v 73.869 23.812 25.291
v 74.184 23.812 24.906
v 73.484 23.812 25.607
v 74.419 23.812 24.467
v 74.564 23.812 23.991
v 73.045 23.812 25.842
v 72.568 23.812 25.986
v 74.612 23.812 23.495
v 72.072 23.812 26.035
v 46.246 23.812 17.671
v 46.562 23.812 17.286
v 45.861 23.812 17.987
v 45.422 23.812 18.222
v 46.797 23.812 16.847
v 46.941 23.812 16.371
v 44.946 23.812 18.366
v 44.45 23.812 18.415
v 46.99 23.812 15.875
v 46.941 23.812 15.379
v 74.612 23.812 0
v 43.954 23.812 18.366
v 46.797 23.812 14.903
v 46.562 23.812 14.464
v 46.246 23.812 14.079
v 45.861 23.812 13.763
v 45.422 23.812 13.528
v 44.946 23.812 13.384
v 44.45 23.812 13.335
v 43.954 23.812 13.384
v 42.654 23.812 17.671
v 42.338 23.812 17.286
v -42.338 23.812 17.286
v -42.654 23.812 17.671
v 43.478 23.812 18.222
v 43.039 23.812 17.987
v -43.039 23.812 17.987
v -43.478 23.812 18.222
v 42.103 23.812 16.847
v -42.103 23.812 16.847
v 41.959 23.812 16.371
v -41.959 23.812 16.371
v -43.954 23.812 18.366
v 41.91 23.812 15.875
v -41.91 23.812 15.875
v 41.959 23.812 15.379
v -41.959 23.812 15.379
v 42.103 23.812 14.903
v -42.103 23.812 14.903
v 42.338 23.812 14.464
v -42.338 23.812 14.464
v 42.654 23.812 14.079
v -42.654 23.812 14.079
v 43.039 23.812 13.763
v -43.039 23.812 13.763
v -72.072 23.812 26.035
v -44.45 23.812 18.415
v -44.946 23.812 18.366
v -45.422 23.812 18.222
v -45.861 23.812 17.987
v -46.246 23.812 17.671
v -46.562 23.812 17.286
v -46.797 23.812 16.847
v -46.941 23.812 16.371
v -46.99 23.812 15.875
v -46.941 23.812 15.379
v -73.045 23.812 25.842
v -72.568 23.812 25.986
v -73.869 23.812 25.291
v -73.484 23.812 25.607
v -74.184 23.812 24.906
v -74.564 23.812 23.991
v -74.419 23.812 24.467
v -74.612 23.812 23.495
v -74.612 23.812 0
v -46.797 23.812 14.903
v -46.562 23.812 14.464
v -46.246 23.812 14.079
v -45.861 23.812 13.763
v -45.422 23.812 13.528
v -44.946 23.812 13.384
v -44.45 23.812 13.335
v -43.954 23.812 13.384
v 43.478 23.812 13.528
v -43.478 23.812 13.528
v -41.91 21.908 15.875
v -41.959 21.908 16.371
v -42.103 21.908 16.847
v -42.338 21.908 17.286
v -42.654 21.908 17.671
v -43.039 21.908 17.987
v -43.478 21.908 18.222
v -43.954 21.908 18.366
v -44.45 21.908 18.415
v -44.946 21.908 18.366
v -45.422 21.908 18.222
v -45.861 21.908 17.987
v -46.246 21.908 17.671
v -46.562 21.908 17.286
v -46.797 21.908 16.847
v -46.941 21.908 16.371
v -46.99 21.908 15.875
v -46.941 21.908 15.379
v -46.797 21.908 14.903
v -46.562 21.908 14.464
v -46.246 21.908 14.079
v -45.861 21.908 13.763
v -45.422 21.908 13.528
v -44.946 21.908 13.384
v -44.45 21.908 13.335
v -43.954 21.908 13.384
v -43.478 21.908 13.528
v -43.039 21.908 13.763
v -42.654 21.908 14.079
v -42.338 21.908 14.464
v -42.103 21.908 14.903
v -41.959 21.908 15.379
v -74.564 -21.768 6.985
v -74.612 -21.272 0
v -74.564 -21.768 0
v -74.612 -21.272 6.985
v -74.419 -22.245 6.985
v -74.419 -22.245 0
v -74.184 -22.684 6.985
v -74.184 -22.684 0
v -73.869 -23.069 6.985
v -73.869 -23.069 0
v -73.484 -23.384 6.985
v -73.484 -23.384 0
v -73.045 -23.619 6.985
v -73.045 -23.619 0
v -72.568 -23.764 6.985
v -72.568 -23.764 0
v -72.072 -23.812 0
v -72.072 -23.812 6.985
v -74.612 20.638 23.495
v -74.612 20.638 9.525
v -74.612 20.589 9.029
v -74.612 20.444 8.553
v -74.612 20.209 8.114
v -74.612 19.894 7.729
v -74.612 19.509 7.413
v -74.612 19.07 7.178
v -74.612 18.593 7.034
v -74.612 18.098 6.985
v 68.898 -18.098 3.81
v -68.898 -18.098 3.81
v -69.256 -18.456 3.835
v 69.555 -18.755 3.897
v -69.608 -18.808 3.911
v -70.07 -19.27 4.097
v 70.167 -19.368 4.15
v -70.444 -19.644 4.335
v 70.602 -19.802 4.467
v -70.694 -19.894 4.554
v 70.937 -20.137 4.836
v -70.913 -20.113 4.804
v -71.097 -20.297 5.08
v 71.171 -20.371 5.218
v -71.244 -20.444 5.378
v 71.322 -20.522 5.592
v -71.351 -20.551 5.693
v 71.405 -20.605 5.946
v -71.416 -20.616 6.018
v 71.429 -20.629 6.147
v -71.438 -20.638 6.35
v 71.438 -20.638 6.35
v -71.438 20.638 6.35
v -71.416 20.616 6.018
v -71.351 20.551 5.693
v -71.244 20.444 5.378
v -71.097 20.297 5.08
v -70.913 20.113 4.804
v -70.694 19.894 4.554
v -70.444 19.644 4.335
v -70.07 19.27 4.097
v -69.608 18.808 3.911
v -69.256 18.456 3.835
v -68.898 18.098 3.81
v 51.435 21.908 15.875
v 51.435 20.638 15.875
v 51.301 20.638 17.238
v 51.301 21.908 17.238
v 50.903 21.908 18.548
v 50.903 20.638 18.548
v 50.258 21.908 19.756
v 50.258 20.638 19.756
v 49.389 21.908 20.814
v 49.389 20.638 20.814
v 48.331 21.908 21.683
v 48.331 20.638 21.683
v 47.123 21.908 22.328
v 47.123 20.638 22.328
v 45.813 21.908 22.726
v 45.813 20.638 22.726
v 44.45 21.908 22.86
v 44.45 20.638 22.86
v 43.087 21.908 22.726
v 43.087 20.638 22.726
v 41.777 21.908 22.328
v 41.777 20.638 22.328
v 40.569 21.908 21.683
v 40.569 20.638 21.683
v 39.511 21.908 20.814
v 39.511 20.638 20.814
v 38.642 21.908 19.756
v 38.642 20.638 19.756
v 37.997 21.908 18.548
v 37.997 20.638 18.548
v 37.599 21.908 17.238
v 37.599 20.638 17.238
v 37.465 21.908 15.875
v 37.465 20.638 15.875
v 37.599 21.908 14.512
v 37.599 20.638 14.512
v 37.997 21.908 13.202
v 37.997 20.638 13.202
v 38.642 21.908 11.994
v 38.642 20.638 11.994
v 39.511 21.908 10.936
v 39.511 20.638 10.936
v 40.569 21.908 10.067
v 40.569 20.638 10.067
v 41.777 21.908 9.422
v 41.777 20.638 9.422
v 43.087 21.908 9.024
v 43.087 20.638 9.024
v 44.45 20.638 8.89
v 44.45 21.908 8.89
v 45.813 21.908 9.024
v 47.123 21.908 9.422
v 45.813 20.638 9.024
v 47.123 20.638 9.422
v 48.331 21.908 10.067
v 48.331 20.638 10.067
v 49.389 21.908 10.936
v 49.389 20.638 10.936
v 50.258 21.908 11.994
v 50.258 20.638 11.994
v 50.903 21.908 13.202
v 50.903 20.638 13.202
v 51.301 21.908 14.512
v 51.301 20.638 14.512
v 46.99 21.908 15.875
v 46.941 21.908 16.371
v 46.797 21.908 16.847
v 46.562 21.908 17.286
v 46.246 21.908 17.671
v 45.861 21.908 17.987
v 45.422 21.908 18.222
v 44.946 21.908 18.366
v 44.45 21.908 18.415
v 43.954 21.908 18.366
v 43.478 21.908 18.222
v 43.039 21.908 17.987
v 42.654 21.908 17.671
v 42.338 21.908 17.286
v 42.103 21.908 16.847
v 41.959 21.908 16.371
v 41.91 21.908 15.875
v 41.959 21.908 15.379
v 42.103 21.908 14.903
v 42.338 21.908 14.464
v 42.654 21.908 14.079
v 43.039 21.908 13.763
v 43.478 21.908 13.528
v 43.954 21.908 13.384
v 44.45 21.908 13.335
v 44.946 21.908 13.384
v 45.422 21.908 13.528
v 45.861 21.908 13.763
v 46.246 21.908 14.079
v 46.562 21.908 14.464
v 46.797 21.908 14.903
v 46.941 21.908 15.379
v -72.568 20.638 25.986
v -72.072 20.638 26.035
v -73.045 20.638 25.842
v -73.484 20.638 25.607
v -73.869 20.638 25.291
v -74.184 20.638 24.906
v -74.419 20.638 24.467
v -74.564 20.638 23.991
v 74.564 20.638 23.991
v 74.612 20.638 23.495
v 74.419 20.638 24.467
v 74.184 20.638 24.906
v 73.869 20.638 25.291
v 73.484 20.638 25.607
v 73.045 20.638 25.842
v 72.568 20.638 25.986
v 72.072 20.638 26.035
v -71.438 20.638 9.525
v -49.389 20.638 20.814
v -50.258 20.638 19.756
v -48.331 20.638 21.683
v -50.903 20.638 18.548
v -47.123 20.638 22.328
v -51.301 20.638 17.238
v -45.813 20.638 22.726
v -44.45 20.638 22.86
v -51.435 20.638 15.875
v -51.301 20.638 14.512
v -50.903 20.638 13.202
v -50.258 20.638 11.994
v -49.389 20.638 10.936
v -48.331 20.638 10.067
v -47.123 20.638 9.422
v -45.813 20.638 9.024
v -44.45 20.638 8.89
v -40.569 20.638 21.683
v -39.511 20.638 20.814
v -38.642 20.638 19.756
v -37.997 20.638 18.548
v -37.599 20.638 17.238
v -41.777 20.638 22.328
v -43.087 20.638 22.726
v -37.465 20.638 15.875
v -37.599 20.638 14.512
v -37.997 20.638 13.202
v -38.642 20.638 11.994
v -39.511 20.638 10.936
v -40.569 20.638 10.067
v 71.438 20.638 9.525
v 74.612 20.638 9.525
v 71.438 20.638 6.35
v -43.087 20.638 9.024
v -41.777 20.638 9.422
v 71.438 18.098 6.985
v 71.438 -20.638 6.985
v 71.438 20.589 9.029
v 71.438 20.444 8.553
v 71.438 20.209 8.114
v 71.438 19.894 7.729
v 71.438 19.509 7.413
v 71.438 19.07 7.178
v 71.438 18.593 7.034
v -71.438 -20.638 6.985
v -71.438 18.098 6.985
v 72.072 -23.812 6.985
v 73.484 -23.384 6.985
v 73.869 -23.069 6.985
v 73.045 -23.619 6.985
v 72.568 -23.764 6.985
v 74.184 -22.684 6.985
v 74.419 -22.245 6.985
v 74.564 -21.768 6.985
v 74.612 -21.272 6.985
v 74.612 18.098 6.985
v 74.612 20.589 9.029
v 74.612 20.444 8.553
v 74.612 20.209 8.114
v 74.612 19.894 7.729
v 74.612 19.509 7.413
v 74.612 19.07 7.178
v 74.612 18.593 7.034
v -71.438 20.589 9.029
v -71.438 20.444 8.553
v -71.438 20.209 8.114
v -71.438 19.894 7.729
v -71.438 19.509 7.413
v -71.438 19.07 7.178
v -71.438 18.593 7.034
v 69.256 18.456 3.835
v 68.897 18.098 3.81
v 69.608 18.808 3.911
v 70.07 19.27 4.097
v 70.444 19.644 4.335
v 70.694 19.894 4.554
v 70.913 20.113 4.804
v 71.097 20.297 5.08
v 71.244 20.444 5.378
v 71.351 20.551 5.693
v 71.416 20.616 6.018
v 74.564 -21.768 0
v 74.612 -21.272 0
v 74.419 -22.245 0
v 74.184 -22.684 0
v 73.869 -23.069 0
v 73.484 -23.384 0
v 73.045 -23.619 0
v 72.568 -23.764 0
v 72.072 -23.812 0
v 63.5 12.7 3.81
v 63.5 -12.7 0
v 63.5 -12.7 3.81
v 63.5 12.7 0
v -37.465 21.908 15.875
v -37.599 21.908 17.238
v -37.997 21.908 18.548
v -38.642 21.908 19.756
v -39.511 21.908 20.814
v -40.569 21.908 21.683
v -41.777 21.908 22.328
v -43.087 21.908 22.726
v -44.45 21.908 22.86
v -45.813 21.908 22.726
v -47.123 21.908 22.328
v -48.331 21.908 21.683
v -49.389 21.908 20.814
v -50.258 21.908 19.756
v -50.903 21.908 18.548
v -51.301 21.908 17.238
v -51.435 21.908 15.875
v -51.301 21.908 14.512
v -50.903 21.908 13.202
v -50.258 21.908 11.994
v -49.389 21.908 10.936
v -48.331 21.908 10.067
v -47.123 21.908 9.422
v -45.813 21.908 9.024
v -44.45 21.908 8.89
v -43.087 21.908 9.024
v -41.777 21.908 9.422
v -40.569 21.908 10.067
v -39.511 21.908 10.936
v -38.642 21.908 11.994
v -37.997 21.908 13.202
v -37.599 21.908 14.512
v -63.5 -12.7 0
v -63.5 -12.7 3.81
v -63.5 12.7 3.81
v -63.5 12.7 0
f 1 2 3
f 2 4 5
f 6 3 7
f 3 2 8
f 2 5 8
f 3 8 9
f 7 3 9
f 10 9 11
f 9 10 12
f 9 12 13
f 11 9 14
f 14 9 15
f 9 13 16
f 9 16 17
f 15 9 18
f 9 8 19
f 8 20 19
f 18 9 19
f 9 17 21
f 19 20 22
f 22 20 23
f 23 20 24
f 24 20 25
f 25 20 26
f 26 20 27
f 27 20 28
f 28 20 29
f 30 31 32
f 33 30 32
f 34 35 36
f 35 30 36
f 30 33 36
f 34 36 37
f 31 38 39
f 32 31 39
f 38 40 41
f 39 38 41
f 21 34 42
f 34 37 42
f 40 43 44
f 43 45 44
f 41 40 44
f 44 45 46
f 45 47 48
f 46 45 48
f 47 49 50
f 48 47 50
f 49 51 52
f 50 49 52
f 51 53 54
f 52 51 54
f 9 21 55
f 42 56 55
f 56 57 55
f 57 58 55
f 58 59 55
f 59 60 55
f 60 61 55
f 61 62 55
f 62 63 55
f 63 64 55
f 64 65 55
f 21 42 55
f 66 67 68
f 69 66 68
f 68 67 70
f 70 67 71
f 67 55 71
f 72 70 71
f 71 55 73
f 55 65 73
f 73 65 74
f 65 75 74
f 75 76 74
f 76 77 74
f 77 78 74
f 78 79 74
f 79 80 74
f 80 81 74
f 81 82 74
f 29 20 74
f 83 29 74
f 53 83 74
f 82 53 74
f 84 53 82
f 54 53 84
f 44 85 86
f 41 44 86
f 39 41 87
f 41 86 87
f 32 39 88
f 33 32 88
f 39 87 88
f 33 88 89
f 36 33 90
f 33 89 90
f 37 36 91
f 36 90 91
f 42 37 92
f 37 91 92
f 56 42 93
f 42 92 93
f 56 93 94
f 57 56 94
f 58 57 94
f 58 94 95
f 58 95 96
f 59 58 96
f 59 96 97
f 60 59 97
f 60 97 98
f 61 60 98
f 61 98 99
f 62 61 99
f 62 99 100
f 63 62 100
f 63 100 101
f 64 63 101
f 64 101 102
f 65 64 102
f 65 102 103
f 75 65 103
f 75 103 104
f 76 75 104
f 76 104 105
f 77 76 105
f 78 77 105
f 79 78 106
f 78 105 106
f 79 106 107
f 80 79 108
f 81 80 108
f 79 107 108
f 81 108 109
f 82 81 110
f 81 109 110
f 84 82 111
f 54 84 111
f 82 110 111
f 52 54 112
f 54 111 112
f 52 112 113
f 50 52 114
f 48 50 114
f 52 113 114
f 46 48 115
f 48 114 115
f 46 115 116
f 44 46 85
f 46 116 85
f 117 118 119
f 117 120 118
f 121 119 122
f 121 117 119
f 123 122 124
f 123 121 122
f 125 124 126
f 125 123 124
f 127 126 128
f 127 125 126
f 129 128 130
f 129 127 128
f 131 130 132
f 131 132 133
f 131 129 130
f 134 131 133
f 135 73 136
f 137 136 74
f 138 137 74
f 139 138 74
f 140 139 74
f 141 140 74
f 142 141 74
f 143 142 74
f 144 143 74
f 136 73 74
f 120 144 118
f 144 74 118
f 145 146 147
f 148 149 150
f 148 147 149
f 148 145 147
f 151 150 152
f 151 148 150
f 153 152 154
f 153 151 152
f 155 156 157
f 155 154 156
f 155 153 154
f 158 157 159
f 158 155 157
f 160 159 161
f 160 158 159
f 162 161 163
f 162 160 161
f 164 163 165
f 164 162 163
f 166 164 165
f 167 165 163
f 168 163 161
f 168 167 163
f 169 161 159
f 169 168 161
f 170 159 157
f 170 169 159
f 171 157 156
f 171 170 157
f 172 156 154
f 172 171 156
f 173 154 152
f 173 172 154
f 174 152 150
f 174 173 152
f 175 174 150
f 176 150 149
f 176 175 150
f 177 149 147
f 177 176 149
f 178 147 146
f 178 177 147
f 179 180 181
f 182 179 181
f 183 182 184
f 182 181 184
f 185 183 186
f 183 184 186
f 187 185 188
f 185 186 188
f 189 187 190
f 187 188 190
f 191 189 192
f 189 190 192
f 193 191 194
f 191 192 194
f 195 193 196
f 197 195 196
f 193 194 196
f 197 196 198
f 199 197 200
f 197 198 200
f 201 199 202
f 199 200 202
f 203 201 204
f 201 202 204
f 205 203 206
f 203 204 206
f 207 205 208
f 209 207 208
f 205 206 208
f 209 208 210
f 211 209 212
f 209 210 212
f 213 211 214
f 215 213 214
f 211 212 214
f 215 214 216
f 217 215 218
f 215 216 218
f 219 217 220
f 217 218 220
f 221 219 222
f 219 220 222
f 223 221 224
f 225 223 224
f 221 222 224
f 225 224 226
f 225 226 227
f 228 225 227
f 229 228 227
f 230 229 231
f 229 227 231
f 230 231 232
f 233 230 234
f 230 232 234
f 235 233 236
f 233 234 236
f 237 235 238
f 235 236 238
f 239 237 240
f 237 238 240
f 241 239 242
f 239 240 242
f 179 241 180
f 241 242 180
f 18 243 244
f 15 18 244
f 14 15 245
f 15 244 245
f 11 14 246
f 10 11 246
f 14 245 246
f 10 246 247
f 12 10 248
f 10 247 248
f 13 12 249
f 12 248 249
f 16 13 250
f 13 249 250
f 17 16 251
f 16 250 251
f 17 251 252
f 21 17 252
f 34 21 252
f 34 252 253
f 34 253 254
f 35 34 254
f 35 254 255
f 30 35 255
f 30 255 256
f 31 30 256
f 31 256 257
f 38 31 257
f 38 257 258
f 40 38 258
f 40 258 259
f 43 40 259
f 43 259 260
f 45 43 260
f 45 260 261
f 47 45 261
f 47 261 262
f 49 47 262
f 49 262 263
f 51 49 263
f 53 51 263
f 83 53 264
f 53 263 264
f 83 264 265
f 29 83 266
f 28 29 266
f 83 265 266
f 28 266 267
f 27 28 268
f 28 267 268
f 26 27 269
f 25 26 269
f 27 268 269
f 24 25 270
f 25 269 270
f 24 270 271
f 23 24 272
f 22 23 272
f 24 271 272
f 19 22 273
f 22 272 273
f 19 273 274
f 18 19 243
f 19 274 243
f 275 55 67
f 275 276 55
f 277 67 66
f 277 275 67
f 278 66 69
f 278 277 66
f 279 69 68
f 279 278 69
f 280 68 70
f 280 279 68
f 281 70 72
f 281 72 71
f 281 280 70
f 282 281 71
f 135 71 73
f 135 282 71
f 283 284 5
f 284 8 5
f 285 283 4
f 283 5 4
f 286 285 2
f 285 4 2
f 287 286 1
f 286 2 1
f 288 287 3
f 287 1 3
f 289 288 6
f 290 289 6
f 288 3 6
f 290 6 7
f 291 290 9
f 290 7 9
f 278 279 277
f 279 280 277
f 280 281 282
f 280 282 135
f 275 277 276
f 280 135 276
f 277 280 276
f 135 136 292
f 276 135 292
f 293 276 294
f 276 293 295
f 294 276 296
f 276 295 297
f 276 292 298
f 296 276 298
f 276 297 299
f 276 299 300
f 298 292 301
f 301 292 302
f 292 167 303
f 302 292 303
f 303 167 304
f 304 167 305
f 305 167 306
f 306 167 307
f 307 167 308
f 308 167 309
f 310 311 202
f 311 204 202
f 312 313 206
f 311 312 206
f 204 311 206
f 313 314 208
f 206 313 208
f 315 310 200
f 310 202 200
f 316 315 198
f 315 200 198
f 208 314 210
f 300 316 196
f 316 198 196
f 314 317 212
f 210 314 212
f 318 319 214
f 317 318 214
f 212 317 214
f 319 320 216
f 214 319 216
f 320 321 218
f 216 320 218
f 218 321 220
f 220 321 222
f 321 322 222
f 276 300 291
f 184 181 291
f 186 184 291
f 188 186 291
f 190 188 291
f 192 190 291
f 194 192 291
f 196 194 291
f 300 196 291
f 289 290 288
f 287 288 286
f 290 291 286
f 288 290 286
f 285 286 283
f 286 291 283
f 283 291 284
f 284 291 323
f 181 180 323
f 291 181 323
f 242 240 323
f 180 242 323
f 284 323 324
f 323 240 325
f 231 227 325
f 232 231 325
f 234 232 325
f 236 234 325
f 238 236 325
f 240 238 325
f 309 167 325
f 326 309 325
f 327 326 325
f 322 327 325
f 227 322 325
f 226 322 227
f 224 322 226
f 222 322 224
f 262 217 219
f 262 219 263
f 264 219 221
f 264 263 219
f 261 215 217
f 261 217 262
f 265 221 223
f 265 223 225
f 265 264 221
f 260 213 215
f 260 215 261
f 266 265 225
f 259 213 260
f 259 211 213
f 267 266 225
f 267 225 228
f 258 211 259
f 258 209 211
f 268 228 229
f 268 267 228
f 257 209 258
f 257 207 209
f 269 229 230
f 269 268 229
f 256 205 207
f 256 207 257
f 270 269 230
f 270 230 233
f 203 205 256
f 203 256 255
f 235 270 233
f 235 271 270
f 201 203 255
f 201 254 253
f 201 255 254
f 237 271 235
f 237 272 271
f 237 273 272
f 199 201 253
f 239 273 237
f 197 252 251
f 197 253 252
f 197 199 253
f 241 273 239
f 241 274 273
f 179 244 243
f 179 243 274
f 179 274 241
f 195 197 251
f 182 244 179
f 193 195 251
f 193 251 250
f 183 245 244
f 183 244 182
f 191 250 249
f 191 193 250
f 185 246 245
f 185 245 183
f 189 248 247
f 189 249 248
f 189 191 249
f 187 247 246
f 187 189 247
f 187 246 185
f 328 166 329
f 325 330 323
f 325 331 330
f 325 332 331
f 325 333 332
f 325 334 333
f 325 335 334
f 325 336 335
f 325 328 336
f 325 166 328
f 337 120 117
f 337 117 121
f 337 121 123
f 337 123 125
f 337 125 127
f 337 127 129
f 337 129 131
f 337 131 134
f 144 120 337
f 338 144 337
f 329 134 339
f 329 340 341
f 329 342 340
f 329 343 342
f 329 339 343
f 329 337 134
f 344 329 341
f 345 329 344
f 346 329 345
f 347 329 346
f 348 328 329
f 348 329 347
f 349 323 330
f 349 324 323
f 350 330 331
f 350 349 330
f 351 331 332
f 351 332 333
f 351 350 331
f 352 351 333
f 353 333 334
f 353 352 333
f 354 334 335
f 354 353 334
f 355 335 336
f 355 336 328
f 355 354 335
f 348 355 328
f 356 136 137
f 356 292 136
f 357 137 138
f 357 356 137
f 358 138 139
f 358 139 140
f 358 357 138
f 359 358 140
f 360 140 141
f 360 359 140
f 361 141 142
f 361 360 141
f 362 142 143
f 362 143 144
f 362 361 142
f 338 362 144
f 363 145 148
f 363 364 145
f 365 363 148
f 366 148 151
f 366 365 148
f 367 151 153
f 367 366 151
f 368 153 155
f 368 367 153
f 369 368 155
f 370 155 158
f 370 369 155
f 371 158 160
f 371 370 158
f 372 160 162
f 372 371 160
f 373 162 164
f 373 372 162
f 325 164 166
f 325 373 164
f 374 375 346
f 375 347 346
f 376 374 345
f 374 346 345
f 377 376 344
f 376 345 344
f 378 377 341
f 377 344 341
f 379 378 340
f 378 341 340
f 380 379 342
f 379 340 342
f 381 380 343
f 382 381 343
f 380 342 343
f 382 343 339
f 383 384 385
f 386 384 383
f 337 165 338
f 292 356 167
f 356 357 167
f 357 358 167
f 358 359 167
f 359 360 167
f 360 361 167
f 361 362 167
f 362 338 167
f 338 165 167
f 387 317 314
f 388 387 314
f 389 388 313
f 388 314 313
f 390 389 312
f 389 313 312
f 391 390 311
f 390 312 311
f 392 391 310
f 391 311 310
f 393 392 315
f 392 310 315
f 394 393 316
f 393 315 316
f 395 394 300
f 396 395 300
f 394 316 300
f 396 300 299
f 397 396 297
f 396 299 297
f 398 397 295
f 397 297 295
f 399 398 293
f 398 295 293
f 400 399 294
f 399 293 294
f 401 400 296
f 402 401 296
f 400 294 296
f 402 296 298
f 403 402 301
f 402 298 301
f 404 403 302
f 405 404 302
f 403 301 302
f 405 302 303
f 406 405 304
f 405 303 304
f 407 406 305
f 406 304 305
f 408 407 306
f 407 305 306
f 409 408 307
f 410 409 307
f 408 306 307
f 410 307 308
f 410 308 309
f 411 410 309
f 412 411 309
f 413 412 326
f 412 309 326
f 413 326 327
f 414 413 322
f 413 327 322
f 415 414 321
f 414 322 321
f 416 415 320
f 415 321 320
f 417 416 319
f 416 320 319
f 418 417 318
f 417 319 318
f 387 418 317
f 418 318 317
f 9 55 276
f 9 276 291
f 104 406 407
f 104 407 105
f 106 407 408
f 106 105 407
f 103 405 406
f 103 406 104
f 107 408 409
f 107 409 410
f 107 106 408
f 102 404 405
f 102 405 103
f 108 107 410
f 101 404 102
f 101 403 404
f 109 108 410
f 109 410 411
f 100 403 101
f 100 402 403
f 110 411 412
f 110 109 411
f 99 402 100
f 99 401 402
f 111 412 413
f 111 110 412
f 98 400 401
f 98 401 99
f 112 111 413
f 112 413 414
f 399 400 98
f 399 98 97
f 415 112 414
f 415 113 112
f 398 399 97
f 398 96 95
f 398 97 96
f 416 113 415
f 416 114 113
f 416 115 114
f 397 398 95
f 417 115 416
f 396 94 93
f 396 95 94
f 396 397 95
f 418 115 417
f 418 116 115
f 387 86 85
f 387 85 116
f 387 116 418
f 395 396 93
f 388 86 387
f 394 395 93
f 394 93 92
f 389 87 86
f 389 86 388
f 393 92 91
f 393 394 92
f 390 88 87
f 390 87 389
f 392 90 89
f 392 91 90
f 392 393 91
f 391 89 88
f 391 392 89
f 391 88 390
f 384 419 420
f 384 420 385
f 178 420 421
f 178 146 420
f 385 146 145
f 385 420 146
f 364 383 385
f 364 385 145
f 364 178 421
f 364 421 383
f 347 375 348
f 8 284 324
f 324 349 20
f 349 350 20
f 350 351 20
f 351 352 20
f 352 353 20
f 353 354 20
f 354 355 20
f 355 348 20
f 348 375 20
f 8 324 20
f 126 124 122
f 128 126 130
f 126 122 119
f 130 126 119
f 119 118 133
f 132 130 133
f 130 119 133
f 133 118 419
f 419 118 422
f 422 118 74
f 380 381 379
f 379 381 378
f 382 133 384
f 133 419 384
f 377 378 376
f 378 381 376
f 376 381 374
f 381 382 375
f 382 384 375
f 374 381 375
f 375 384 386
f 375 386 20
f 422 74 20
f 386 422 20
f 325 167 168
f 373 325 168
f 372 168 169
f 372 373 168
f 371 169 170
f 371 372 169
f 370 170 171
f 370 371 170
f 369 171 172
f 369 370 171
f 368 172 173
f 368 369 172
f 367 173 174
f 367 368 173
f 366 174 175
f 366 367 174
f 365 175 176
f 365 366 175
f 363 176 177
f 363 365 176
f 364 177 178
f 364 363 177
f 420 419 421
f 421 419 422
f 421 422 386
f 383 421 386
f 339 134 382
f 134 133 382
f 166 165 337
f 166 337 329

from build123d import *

# Parameters (mm, degrees)
F0_W     = 149.225
F0_H     = 47.625
F0_W_2   = 127
F0_H_2   = 25.4
F1_DEPTH = 3.81
F2_W     = 149.225
F2_H     = 47.625
F2_W_2   = 142.875
F2_H_2   = 41.275
F3_DEPTH = 3.175
F5_DEPTH = 19.05
F6_R     = 2.54
F7_DEPTH = 25.4
F6_R_2   = 6.985
F8_DEPTH = 1.27
F9_R     = 2.54


with BuildPart() as f1:
    # F0 (on Top) → F1 (new body)
    with BuildSketch(Plane.XY):
        Rectangle(F0_W, F0_H)
        Rectangle(F0_W_2, F0_H_2, mode=Mode.SUBTRACT)
    extrude(amount=F1_DEPTH)

    # F2 (on face) → F3 (join)
    with BuildSketch(Plane.XY.offset(3.81)):
        Rectangle(F2_W, F2_H)
        Rectangle(F2_W_2, F2_H_2, mode=Mode.SUBTRACT)
    extrude(amount=F3_DEPTH)

    # F4 (on face) → F5 (join)
    with BuildSketch(Plane.XY.offset(6.985)):
        Polygon((74.6125, 23.8125), (-74.6125, 23.8125), (-74.6125, 20.6375), (-71.4375, 20.6375), (71.4375, 20.6375), (74.6125, 20.6375), align=None)
    extrude(amount=F5_DEPTH)

    # F6 (on face) → F7 (cut)
    with BuildSketch(Plane.XZ.offset(-20.6375)):
        with Locations((-44.45, 15.875)):
            Circle(F6_R)
        with Locations((44.45, 15.875)):
            Circle(F6_R)
    extrude(amount=-F7_DEPTH, mode=Mode.SUBTRACT)

    # F6 (on face) → F8 (cut)
    with BuildSketch(Plane.XZ.offset(-20.6375)):
        with Locations((-44.45, 15.875)):
            Circle(F6_R_2)
        with Locations((-44.45, 15.875)):
            Circle(F6_R, mode=Mode.SUBTRACT)
        with Locations((44.45, 15.875)):
            Circle(F6_R_2)
        with Locations((44.45, 15.875)):
            Circle(F6_R, mode=Mode.SUBTRACT)
    extrude(amount=-F8_DEPTH, mode=Mode.SUBTRACT)

    # F9
    f9_edges = [f1.edges().sort_by_distance(p)[0] for p in [
        (-73.025, 20.6375, 6.985),
        (73.025, 20.6375, 6.985),
        (0, 20.6375, 3.81),
        (74.6125, 22.225, 26.035),
        (-74.6125, 22.225, 26.035),
        (-74.6125, -23.8125, 3.4925),
        (74.6125, -23.8125, 3.4925),
        (71.4375, 0, 3.81),
        (-71.4375, 0, 3.81),
        (0, -20.6375, 3.81),
    ]]
    fillet(f9_edges, radius=F9_R)


solid = f1.part
